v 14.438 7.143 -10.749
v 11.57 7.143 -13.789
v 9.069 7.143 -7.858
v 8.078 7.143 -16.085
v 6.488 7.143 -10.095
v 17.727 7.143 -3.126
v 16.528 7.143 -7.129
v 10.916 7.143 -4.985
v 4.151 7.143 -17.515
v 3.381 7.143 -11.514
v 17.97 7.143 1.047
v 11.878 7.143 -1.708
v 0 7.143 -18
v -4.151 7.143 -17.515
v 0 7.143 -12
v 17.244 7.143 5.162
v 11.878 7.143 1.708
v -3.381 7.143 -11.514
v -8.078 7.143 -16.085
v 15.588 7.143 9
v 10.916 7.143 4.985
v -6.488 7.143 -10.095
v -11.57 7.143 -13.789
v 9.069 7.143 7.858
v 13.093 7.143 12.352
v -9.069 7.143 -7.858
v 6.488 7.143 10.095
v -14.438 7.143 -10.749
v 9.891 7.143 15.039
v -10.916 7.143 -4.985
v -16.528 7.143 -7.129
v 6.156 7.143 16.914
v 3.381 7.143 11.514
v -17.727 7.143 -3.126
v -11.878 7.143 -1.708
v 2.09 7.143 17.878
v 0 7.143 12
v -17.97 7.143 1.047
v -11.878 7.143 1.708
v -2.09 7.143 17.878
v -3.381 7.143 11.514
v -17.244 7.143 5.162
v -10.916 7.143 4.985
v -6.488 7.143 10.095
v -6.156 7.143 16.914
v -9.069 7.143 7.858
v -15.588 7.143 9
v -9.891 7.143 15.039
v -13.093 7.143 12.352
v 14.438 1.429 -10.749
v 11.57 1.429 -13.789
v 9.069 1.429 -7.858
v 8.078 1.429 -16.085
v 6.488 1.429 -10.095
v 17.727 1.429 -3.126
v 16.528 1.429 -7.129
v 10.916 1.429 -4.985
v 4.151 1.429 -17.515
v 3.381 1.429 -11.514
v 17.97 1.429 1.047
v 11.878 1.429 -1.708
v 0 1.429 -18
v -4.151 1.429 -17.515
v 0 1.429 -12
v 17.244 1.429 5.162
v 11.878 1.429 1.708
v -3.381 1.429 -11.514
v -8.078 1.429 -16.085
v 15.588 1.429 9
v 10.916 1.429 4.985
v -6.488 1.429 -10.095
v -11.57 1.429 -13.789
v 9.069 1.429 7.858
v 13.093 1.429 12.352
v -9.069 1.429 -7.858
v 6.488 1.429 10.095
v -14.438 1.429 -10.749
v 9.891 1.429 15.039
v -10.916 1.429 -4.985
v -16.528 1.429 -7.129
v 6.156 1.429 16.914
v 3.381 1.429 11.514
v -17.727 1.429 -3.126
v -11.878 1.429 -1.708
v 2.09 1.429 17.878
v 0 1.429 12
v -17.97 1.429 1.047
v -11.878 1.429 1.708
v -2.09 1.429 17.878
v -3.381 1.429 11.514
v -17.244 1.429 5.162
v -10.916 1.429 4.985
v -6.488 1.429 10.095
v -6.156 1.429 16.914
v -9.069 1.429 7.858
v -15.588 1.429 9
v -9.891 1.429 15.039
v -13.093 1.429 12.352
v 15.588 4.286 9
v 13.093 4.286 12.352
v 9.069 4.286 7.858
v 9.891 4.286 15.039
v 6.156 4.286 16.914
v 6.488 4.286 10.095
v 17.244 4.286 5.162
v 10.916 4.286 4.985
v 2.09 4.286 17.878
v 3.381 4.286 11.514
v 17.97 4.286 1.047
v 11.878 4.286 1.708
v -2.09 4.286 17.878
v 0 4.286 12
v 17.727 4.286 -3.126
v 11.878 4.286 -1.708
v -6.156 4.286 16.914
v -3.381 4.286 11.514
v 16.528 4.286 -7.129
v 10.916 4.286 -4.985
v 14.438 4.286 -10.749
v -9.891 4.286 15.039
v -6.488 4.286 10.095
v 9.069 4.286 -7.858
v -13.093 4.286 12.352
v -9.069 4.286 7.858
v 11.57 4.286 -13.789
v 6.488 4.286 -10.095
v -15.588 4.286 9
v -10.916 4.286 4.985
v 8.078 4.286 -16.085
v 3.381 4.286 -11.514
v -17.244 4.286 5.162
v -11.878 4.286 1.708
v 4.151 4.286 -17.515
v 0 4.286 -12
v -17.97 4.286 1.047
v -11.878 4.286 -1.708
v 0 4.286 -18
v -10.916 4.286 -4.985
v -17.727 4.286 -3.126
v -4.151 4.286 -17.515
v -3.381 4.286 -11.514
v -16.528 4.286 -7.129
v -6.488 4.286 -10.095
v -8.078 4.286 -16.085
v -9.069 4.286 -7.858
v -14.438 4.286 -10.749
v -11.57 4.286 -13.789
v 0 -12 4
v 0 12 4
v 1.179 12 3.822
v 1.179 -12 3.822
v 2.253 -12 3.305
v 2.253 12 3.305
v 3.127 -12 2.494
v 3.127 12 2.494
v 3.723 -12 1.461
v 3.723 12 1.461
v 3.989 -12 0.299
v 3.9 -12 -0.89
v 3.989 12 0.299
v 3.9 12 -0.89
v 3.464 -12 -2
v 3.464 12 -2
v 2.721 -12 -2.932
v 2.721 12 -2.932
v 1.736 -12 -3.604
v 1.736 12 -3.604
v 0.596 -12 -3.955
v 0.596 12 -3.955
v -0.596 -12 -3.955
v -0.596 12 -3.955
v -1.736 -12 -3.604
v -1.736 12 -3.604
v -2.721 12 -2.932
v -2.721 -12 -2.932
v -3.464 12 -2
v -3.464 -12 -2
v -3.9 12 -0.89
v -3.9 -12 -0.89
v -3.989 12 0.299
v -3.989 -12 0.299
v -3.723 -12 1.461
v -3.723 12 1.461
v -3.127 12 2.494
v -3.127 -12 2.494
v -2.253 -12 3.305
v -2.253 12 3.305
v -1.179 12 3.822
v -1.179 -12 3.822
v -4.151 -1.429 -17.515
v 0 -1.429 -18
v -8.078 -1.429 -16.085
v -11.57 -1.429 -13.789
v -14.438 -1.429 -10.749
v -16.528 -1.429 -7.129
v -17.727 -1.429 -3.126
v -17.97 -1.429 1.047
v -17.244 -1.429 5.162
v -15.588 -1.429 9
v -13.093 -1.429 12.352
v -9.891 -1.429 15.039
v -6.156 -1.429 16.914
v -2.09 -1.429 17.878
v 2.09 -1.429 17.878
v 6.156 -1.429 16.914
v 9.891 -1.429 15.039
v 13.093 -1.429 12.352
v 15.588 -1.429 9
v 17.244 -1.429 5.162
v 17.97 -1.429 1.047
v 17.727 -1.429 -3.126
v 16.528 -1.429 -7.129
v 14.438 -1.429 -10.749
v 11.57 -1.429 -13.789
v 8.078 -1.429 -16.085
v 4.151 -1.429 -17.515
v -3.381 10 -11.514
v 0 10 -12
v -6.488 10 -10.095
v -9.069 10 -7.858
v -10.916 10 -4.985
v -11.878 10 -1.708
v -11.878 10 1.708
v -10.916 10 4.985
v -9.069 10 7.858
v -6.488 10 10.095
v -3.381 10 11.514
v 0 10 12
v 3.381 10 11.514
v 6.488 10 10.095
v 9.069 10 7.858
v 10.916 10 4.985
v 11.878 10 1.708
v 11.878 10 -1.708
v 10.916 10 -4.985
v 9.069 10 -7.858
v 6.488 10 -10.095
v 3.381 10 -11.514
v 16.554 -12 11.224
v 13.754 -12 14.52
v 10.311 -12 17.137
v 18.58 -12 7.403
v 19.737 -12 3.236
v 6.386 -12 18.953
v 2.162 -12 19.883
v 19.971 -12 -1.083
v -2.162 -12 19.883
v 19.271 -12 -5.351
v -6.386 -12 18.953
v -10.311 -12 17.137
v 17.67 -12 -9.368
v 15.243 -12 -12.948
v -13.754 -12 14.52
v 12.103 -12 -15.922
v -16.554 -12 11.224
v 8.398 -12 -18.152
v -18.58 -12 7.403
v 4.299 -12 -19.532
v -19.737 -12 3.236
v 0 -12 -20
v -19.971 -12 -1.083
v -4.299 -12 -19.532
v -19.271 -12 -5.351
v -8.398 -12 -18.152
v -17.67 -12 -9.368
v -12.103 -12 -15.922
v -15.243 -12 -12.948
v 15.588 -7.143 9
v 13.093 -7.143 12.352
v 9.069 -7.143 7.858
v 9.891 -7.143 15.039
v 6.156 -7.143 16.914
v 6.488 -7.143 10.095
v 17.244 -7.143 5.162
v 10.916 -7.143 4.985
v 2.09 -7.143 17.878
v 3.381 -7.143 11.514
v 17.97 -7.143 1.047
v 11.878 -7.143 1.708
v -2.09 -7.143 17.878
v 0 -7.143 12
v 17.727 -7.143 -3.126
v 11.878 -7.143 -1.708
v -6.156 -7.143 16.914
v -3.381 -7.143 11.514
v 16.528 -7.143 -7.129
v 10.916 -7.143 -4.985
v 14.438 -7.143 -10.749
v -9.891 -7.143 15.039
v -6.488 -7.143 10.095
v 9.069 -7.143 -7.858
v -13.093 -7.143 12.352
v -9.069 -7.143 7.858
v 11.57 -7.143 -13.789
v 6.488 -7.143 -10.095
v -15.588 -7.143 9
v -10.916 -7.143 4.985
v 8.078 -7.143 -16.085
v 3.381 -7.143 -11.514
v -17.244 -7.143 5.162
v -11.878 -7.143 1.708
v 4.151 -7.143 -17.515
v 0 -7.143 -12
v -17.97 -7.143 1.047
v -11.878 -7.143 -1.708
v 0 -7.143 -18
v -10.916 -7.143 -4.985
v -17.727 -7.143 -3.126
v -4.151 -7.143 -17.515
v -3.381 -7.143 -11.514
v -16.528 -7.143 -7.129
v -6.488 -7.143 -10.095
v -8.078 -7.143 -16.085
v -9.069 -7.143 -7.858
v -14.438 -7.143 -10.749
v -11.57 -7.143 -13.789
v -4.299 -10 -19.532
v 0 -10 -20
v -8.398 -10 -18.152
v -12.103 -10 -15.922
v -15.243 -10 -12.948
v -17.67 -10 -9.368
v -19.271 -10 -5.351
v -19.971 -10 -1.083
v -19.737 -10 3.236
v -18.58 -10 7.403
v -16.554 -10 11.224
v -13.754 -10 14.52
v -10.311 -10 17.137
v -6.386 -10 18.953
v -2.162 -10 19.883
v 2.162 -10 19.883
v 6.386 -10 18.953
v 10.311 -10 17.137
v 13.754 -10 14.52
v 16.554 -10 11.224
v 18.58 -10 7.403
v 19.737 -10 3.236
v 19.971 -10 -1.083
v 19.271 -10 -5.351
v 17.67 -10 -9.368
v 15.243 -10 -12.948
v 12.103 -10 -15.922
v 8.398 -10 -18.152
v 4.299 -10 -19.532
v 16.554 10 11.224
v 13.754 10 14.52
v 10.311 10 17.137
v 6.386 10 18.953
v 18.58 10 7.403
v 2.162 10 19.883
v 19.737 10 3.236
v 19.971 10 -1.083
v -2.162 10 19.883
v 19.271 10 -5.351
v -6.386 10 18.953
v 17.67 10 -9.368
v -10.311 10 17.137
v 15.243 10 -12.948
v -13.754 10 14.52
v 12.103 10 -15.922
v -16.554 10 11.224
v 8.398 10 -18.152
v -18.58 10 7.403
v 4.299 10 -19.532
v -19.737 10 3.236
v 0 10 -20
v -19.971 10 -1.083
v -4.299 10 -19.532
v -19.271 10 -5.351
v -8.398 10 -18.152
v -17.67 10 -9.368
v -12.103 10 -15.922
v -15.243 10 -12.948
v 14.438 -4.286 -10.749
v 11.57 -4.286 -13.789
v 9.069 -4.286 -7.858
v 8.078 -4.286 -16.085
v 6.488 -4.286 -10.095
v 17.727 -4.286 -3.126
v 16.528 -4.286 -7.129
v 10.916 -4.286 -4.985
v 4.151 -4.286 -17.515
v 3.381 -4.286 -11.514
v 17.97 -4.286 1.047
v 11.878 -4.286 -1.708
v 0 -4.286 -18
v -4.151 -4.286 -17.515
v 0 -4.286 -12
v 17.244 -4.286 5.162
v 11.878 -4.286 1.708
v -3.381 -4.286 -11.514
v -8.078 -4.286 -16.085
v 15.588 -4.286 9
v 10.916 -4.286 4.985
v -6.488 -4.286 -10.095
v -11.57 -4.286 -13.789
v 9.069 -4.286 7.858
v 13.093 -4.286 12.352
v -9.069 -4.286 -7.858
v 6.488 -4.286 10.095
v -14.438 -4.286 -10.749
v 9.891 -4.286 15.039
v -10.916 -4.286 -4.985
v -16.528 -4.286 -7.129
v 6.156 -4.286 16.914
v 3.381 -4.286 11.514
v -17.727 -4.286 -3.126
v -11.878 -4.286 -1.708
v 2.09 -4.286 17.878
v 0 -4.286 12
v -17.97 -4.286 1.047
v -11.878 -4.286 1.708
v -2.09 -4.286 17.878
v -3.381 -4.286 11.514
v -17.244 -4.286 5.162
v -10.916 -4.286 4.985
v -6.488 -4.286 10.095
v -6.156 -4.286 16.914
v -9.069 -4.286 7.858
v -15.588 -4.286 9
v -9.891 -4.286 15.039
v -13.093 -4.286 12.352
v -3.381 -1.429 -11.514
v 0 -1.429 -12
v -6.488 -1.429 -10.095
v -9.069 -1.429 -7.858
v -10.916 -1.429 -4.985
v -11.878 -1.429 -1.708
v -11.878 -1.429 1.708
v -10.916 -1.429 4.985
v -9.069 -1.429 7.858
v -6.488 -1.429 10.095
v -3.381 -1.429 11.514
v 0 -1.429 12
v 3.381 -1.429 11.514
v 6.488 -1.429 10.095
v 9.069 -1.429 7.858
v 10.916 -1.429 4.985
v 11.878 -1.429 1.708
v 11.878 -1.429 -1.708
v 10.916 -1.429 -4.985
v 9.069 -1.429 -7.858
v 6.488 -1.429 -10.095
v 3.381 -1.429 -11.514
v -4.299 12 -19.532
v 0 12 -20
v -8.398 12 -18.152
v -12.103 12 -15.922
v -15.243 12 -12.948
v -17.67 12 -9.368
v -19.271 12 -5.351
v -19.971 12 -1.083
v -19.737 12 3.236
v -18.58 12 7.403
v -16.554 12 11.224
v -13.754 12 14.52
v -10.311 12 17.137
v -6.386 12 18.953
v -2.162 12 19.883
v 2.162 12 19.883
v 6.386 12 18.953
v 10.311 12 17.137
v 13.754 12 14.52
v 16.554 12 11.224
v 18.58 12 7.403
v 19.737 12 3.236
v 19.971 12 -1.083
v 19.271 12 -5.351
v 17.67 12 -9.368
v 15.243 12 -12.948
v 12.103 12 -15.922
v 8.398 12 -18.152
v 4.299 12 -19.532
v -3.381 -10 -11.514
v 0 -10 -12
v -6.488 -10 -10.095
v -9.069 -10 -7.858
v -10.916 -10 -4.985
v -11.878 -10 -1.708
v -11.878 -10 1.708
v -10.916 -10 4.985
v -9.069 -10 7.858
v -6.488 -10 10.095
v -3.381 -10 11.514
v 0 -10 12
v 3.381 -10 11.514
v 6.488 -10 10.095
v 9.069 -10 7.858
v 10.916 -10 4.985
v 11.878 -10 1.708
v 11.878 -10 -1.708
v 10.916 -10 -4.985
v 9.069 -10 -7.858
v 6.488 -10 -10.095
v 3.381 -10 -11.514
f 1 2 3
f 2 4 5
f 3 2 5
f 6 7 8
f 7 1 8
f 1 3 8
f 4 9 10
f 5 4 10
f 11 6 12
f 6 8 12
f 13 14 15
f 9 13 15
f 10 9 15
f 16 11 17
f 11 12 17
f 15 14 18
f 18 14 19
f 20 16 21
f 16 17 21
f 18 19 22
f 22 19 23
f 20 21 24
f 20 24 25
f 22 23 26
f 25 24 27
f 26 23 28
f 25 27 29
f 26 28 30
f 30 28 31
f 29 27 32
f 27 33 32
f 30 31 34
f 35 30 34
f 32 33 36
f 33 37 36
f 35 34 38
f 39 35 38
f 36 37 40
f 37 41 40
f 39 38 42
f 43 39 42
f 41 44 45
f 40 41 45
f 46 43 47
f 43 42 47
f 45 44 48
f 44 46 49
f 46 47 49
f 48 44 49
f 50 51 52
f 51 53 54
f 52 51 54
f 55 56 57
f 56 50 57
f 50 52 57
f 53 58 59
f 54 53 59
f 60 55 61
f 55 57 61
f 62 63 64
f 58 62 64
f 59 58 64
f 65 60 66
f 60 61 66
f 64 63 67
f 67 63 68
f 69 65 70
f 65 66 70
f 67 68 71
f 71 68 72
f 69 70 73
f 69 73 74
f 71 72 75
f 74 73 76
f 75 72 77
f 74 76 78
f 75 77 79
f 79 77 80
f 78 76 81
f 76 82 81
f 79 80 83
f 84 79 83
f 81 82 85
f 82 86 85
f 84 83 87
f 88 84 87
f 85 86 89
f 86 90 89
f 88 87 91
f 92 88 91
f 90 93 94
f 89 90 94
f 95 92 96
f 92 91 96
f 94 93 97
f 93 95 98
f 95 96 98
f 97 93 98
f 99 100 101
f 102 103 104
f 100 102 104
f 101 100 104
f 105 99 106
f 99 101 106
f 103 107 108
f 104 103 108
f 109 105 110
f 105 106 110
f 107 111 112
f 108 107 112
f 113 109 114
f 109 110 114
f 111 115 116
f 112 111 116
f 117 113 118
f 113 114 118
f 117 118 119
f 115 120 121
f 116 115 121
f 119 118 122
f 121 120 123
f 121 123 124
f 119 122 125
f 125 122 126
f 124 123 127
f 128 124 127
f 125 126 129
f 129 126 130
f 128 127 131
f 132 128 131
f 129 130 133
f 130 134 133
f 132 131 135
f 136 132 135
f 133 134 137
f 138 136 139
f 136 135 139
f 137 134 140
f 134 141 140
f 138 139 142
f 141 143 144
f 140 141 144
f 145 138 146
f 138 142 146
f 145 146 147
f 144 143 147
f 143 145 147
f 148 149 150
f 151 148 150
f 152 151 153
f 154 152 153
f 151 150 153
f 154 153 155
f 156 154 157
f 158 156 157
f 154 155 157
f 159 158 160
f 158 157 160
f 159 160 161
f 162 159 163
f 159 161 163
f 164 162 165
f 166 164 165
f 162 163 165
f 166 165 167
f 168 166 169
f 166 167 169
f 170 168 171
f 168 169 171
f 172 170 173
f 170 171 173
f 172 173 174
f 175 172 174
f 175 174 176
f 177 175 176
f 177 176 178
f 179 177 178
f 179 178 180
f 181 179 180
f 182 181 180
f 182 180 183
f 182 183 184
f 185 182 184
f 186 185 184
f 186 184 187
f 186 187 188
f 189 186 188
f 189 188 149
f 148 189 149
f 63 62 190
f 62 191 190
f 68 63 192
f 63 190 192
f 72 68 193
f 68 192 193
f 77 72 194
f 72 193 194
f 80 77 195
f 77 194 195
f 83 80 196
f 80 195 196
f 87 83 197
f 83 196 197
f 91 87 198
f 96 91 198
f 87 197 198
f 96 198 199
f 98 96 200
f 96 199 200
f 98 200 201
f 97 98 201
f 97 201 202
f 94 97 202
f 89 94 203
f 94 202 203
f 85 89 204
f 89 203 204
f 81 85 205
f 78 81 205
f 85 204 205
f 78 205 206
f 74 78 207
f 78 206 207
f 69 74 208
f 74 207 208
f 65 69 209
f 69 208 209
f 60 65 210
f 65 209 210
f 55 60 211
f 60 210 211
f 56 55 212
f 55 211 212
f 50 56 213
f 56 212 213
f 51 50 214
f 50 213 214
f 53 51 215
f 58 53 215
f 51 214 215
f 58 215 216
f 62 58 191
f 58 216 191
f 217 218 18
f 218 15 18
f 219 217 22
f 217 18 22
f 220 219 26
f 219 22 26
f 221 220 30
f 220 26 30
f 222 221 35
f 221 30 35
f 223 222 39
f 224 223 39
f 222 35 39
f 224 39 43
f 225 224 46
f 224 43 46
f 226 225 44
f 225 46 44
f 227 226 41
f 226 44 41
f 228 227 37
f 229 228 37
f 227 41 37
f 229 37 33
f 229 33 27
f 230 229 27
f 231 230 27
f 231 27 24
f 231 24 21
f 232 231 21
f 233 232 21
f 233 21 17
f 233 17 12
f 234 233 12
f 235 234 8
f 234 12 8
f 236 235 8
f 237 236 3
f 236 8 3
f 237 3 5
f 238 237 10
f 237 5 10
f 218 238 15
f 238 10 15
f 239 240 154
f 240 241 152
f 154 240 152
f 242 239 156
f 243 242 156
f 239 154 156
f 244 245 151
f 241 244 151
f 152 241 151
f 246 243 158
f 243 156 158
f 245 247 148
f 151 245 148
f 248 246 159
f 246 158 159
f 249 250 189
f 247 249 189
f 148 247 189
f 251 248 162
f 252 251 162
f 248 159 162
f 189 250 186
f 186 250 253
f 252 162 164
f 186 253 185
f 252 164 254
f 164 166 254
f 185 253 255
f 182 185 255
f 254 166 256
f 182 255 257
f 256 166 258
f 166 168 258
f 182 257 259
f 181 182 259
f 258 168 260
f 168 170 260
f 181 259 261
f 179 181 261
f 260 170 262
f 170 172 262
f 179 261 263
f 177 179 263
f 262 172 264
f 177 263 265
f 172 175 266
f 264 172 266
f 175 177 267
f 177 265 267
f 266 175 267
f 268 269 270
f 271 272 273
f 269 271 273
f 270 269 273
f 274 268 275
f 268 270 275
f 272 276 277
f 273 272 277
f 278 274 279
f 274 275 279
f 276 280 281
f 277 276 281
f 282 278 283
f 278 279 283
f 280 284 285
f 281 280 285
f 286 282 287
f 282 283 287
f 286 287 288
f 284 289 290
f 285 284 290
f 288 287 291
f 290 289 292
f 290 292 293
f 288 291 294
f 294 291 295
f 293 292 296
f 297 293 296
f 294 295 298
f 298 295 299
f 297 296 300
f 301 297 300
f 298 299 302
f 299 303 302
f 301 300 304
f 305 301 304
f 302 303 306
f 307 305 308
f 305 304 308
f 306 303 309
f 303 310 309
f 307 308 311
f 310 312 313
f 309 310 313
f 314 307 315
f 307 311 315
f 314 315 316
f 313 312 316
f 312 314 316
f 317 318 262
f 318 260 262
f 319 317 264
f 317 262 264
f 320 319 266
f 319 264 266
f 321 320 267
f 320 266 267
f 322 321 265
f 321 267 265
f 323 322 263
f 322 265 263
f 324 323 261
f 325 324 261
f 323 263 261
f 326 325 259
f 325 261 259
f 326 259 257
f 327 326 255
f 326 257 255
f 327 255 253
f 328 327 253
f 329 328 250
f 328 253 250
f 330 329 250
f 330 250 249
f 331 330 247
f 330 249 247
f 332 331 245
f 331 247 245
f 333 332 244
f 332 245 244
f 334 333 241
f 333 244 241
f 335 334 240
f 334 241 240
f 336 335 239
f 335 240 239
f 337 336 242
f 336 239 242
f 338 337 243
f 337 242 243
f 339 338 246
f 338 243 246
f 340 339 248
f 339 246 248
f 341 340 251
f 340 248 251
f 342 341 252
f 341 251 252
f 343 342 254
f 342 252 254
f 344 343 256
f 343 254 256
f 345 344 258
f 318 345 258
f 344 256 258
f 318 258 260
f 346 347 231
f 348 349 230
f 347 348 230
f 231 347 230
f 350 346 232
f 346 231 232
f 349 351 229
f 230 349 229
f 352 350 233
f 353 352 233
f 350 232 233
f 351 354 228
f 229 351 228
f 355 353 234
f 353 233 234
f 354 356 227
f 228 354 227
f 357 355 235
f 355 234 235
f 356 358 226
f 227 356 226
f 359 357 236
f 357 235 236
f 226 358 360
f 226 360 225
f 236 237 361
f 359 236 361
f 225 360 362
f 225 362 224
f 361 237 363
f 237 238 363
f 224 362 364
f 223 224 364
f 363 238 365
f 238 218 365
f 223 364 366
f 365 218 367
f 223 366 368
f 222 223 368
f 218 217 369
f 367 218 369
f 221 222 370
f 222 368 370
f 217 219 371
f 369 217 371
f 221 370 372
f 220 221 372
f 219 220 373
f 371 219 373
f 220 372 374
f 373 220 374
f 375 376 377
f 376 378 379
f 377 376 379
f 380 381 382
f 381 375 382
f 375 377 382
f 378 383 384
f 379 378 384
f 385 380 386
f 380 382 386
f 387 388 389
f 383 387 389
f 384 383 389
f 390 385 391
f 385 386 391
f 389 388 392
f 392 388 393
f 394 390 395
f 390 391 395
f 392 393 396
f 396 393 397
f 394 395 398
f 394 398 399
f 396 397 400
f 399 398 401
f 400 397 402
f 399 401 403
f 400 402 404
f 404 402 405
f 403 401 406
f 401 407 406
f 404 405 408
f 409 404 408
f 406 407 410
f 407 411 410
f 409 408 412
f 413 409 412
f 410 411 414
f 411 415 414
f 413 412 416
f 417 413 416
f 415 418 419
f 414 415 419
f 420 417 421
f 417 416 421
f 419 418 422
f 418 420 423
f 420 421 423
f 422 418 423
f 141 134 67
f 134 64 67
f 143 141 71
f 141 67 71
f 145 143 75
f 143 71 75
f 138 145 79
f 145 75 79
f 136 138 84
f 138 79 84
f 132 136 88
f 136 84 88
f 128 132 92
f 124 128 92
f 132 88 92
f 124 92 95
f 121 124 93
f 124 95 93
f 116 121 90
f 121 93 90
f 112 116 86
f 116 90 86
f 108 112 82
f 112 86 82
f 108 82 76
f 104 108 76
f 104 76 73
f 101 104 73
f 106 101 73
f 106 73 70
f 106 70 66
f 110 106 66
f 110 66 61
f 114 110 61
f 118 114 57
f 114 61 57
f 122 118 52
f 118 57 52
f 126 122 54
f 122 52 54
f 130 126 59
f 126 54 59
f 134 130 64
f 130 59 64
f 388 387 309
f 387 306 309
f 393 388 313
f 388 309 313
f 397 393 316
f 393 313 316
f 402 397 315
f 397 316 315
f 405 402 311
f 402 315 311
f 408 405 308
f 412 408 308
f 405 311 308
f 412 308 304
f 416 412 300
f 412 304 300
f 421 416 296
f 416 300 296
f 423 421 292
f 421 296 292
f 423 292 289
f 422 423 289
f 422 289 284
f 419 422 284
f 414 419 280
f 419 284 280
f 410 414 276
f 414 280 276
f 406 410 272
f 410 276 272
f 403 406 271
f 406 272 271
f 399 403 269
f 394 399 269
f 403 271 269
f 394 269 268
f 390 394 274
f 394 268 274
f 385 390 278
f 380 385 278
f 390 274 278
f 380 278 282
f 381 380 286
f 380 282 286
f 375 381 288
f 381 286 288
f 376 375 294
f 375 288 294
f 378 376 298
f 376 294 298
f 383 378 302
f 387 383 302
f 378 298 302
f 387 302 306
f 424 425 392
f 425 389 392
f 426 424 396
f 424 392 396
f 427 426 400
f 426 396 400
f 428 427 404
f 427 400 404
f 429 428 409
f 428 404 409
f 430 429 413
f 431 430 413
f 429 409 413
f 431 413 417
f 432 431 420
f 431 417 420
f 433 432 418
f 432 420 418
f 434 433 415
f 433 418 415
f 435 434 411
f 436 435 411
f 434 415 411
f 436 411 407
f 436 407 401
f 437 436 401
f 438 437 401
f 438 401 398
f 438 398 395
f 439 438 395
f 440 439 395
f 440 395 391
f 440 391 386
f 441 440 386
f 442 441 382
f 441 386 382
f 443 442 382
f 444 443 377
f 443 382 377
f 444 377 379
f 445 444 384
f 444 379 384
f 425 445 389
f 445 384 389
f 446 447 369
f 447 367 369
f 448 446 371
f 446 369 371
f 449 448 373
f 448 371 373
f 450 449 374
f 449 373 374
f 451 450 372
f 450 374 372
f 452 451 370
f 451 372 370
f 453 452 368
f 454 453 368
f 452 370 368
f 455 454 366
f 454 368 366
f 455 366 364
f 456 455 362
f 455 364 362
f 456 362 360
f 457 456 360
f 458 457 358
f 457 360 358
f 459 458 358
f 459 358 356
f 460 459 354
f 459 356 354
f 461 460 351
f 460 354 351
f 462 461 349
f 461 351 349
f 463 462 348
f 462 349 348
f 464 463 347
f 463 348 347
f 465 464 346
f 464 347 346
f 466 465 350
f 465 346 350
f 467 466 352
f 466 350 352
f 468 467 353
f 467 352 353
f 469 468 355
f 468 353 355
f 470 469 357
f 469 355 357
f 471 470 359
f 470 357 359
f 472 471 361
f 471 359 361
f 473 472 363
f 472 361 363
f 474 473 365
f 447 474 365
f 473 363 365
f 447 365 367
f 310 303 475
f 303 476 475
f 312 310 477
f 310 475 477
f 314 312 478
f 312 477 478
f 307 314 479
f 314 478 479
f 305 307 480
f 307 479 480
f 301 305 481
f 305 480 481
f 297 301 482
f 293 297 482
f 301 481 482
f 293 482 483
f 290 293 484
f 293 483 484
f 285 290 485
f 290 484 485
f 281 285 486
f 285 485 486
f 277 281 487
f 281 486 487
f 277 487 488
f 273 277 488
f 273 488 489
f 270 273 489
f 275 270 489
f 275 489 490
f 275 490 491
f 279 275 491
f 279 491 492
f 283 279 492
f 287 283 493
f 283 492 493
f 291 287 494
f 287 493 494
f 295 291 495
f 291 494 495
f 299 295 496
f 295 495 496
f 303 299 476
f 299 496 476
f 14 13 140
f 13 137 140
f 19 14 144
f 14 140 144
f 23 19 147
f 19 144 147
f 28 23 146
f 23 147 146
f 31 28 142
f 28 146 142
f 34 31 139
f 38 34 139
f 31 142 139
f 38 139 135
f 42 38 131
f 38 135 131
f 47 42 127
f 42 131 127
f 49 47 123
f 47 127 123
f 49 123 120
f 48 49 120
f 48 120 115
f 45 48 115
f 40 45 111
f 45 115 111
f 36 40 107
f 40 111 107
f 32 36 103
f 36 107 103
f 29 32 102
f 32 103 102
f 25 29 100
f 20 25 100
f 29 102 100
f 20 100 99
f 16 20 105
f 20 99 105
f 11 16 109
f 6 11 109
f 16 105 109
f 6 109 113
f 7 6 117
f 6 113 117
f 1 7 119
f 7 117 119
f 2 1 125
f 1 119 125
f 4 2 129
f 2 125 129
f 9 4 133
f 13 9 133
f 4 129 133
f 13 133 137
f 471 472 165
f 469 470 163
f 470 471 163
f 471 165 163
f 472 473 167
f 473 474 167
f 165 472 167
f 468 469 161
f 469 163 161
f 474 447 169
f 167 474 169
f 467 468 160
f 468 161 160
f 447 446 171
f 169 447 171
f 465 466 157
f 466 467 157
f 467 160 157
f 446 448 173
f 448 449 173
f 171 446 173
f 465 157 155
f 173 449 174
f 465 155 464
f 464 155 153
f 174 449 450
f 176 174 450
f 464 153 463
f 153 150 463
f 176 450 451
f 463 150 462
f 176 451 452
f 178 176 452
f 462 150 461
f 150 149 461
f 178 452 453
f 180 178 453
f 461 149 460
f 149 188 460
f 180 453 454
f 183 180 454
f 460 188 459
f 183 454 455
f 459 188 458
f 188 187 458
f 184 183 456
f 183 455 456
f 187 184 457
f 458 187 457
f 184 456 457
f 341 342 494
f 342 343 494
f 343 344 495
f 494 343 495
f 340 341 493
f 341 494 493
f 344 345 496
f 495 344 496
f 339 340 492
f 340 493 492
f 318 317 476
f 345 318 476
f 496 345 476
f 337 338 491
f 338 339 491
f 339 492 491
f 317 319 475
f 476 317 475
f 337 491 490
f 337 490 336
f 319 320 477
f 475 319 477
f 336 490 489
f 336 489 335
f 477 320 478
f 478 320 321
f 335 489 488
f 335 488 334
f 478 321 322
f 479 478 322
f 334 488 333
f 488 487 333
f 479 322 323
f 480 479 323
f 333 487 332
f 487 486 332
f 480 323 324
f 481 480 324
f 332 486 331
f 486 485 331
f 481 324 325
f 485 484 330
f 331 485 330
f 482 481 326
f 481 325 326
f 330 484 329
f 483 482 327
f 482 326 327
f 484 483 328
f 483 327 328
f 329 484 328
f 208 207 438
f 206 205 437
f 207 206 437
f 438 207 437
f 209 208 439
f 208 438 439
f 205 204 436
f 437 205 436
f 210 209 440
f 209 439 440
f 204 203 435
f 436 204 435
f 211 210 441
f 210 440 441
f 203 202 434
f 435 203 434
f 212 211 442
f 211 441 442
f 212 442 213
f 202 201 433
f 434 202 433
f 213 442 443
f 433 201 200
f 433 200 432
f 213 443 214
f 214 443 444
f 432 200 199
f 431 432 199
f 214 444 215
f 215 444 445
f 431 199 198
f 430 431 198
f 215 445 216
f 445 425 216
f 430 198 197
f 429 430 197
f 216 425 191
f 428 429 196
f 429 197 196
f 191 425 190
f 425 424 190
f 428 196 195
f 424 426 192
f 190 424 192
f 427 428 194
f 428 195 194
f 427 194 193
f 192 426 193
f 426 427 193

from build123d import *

# Parameters (mm, degrees)
SKETCH3_R          = 4
CUT_EXTRUDE1_DEPTH = 38.094473982


with BuildPart() as part:
    # Sketch2 → Revolve1 (revolve)
    with BuildSketch(Plane(origin=(0, 0, 0), x_dir=(0, 0, -1), z_dir=(1, 0, 0))):
        Polygon((0, -12), (0, 12), (20, 12), (20, 10), (12, 10), (12, 7.142857143), (18, 7.142857143), (18, 4.285714286), (12, 4.285714286), (12, 1.428571429), (18, 1.428571429), (18, -1.428571429), (12, -1.428571429), (12, -4.285714286), (18, -4.285714286), (18, -7.142857143), (12, -7.142857143), (12, -10), (20, -10), (20, -12), align=None)
    revolve(axis=Axis((0, -52.077930442, 0), (0, 1, 0)))

    # Sketch3 → Cut-Extrude1 (cut, through all)
    with BuildSketch(Plane(origin=(0, 12, 0), x_dir=(1, 0, 0), z_dir=(0, 1, 0))):
        with Locations(Location((0, 0, 0), (0, 0, 270))):
            Circle(SKETCH3_R)
    extrude(amount=-CUT_EXTRUDE1_DEPTH, mode=Mode.SUBTRACT)


solid = part.part
